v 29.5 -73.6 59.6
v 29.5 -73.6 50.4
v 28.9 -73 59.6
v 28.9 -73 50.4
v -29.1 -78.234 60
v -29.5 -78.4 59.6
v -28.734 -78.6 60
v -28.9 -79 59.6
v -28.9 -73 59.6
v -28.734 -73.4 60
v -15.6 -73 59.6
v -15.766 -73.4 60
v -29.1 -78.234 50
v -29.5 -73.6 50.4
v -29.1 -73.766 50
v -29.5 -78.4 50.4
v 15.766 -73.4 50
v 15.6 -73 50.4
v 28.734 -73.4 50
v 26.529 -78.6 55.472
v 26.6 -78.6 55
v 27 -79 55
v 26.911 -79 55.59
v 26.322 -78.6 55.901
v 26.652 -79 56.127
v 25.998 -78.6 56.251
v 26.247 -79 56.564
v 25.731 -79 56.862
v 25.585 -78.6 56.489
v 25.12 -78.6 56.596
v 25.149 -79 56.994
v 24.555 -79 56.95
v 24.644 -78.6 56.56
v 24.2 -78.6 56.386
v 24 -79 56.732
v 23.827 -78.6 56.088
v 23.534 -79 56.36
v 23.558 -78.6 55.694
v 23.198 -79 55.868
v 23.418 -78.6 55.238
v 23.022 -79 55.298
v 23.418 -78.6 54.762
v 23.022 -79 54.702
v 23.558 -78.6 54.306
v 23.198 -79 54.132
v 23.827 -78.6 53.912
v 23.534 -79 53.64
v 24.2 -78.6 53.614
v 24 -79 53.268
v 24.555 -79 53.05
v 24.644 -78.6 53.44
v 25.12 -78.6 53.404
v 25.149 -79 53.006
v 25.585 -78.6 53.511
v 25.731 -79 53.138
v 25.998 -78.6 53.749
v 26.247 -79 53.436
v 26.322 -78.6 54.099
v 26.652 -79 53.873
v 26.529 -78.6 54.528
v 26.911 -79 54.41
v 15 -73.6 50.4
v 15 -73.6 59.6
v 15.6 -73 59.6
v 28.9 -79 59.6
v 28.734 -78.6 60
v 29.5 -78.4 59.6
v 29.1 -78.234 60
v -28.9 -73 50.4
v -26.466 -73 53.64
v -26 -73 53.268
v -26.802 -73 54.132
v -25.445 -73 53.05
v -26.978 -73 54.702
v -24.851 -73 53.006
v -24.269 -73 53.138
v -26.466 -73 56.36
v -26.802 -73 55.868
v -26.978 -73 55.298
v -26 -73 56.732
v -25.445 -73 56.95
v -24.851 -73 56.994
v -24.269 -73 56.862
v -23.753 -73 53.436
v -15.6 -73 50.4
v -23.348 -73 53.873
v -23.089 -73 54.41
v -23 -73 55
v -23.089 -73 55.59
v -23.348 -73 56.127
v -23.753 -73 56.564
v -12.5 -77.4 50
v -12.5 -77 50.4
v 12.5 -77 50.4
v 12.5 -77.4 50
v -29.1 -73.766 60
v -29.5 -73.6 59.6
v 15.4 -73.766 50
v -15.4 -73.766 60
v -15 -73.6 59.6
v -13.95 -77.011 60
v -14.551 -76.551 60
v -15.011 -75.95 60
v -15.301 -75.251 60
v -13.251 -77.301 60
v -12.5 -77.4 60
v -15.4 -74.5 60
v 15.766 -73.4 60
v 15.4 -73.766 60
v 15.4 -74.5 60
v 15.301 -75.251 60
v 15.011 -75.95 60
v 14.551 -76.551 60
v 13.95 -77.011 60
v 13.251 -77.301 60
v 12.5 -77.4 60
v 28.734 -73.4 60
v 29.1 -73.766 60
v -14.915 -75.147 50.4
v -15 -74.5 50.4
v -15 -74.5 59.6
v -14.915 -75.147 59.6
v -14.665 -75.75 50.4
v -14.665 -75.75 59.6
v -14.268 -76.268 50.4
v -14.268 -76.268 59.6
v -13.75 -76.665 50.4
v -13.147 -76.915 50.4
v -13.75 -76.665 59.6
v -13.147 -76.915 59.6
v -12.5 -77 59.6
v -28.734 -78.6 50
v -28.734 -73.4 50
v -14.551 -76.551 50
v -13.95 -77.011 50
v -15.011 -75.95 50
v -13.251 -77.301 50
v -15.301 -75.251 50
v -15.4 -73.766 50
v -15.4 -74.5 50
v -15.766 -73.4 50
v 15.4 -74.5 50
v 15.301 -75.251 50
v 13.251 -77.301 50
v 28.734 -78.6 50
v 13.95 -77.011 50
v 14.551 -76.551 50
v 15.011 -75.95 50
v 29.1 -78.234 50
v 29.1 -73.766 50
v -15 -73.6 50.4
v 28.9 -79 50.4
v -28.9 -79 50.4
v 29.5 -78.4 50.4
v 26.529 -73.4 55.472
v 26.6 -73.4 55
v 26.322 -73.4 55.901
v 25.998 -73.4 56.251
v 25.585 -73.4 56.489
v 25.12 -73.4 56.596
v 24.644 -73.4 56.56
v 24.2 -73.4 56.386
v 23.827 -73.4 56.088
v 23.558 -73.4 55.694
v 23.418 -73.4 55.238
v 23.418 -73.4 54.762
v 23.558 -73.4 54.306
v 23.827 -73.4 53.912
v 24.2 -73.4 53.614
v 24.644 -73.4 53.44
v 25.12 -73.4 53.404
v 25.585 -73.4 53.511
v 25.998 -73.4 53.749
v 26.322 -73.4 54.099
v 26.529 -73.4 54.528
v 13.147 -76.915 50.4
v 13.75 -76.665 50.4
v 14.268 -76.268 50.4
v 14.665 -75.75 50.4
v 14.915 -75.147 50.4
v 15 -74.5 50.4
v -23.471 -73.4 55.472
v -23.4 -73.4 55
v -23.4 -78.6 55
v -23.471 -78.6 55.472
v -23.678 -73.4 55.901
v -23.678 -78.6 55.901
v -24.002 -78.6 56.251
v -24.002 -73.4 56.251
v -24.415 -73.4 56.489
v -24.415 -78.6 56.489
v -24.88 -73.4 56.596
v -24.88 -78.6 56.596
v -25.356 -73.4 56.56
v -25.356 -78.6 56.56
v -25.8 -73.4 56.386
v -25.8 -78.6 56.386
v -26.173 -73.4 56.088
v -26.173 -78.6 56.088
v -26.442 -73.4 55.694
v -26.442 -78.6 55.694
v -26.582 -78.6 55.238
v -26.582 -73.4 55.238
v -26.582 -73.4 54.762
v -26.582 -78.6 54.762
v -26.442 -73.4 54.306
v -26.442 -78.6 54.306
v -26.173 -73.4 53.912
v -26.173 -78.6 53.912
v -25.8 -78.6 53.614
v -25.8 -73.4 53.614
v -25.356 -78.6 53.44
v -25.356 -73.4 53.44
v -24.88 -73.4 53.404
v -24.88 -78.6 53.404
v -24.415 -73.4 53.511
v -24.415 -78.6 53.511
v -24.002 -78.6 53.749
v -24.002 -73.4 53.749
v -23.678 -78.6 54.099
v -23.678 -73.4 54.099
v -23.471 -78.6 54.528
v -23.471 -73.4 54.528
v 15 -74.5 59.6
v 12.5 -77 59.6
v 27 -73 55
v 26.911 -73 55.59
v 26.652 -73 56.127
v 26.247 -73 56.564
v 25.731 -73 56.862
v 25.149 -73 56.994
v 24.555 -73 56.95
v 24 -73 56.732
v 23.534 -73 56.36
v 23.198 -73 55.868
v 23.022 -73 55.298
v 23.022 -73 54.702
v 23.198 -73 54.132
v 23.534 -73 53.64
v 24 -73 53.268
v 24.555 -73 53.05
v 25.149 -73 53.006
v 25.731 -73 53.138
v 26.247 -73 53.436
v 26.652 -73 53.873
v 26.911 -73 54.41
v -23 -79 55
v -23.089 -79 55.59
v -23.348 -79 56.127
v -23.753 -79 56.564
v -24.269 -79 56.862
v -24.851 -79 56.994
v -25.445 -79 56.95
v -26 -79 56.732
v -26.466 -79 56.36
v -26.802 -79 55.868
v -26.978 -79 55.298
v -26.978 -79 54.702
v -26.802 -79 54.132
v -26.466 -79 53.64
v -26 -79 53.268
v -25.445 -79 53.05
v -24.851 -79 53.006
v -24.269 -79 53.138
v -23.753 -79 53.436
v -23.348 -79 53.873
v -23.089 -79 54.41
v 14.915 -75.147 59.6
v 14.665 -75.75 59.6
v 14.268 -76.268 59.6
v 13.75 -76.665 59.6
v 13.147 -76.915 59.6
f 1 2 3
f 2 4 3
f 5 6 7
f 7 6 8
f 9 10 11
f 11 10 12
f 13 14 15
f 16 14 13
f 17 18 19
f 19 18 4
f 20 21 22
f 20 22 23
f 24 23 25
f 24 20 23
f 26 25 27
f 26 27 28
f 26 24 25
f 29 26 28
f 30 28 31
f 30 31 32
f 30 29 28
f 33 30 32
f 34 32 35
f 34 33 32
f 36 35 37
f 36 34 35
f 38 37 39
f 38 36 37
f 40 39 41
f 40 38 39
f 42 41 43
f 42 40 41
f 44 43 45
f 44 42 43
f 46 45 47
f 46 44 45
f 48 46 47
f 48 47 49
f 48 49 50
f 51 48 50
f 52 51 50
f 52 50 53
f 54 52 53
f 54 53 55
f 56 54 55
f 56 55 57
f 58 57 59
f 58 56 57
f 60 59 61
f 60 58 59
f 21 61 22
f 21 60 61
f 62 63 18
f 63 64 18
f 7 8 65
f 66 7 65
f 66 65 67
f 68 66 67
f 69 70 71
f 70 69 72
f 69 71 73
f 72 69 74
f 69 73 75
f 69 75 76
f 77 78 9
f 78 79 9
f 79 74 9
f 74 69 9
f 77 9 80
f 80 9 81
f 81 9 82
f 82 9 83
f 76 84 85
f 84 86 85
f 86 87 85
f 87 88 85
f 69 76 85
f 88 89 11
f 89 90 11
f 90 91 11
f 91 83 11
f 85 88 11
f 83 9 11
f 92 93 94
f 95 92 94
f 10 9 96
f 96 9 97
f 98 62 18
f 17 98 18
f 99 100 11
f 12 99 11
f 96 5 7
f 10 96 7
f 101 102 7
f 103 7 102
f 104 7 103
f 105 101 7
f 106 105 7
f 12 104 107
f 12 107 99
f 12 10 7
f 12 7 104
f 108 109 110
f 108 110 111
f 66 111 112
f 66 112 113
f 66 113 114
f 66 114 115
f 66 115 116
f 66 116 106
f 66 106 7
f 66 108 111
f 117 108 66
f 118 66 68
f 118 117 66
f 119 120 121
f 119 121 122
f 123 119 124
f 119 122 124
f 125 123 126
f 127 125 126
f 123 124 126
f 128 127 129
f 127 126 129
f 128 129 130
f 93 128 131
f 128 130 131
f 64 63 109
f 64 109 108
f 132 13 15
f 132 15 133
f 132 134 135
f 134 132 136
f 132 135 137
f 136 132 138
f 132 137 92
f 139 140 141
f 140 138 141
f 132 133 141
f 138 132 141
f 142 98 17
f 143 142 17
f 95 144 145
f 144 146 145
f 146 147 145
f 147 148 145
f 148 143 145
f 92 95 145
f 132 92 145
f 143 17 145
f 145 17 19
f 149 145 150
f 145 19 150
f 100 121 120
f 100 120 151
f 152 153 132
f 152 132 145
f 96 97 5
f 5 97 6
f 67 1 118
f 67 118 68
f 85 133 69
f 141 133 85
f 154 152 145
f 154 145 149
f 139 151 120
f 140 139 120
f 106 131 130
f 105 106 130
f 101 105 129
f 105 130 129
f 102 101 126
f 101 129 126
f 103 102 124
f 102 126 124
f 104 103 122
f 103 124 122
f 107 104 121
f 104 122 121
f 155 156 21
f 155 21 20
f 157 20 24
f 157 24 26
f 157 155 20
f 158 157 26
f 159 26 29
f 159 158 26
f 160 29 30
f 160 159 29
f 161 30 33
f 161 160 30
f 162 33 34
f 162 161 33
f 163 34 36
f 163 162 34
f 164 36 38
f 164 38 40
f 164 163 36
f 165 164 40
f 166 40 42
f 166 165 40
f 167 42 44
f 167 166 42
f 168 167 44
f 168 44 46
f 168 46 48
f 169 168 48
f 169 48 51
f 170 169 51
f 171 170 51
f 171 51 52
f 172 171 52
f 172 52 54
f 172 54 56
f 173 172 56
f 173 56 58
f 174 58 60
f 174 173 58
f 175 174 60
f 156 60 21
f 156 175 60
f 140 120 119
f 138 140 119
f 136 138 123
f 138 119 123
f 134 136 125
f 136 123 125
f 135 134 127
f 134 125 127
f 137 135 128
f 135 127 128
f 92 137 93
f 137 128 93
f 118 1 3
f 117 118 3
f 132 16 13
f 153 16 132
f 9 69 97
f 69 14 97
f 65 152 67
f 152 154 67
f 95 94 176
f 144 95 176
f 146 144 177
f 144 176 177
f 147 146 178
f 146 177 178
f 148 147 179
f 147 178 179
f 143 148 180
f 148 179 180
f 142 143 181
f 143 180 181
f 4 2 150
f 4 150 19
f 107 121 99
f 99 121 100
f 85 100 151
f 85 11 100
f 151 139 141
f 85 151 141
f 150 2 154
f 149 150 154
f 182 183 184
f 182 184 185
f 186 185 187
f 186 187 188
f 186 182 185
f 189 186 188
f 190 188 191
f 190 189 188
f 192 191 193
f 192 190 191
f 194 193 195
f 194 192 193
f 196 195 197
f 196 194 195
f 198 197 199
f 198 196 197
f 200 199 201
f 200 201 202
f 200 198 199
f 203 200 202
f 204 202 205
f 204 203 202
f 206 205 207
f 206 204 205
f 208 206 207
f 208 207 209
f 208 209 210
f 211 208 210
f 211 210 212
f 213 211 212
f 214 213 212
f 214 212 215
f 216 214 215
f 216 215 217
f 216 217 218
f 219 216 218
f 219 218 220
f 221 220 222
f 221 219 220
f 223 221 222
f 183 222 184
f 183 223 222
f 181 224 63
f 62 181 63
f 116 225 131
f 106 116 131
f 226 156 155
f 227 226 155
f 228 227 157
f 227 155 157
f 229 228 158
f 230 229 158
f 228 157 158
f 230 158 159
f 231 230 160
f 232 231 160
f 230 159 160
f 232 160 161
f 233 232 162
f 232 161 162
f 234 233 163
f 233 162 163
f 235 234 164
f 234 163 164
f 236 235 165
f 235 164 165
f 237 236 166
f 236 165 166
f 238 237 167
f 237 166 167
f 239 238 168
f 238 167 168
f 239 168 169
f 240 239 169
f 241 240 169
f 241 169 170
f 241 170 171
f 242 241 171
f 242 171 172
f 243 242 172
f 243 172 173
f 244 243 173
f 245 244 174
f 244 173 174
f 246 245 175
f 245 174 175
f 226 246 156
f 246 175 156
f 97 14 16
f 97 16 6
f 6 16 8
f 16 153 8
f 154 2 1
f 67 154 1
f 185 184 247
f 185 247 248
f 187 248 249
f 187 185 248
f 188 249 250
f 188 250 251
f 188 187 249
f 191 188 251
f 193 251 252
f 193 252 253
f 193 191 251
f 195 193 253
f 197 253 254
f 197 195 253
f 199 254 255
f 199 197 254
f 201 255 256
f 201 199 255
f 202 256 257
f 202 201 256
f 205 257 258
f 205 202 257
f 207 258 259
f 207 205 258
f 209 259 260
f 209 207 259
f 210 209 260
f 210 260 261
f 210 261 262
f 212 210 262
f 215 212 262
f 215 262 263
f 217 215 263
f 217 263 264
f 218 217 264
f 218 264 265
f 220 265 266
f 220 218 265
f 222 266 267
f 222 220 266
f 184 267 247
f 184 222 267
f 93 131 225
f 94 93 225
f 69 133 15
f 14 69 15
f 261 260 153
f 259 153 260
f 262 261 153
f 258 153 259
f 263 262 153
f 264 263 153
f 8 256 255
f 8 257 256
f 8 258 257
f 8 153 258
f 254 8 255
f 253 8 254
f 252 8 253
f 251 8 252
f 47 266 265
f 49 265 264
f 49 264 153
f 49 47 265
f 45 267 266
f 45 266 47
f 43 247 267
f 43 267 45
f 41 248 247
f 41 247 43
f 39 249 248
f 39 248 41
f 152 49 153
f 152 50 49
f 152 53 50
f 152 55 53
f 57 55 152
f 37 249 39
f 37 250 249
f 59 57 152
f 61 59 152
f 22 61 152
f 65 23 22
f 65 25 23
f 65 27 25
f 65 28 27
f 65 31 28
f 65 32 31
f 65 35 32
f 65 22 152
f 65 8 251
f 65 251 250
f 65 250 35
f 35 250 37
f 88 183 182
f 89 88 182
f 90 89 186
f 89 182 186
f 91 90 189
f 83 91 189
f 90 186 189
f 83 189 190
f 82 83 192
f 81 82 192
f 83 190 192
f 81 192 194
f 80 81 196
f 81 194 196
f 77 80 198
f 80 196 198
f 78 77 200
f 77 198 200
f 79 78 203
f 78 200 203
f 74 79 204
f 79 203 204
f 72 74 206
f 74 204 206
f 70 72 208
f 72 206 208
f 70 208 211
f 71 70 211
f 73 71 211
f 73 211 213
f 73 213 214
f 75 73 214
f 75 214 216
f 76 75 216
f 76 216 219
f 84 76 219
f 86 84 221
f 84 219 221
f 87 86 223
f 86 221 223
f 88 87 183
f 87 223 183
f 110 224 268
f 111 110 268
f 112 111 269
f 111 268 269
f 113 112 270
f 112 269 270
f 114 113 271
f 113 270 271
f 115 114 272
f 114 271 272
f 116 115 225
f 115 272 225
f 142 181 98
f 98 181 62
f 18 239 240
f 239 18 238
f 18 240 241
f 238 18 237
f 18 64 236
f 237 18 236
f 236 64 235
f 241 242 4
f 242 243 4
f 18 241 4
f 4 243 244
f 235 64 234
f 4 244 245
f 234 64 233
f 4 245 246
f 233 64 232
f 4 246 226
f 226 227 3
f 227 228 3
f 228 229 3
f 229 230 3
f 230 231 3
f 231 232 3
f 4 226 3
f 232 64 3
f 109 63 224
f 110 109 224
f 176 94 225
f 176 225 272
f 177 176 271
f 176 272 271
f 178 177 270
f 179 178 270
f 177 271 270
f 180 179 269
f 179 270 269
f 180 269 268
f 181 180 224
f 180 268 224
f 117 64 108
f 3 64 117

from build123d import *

# Parameters (mm, degrees)
SKETCH134_W     = 59
SKETCH134_H     = 10
SKETCH134_R     = 1.6
PAD068_DEPTH    = 6
SKETCH135_W     = 30
SKETCH135_H     = 4
POCKET066_DEPTH = 7.5
FILLET048_R     = 2.5
CHAMFER053_SIZE = 0.6
CHAMFER054_SIZE = 0.4
CHAMFER055_SIZE = 0.4


with BuildPart() as part:
    # Sketch134 → Pad068 (new body)
    with BuildSketch(Plane.XZ):
        Rectangle(SKETCH134_W, SKETCH134_H)
        with Locations((-25, 0)):
            Circle(SKETCH134_R, mode=Mode.SUBTRACT)
        with Locations((25, 0)):
            Circle(SKETCH134_R, mode=Mode.SUBTRACT)
    extrude(amount=PAD068_DEPTH)

    # Sketch135 → Pocket066 (cut, symmetric)
    with BuildSketch(Plane.XY):
        with Locations((0, -2)):
            Rectangle(SKETCH135_W, SKETCH135_H)
    extrude(amount=POCKET066_DEPTH, both=True, mode=Mode.SUBTRACT)

    # Fillet048
    fillet048_edges = [part.edges().sort_by_distance(p)[0] for p in [
        (15, -4, 0),
        (-15, -4, 0),
    ]]
    fillet(fillet048_edges, radius=FILLET048_R)

    # Chamfer053
    chamfer053_edges = [part.edges().sort_by_distance(p)[0] for p in [
        (15, 0, 0),
        (-15, 0, 0),
        (29.5, 0, 0),
        (29.5, -6, 0),
        (-29.5, -6, 0),
        (-29.5, 0, 0),
    ]]
    chamfer(chamfer053_edges, length=CHAMFER053_SIZE)

    # Chamfer054
    chamfer054_edges = [part.edges().sort_by_distance(p)[0] for p in [
        (26.6, -3, 0),
        (23.4, 0, 0),
        (23.4, -6, 0),
        (-23.4, -3, 0),
        (-26.6, 0, 0),
        (-26.6, -6, 0),
    ]]
    chamfer(chamfer054_edges, length=CHAMFER054_SIZE)

    # Chamfer055
    chamfer055_edges = [part.edges().sort_by_distance(p)[0] for p in [
        (-15, -1.05, 5),
        (-15.3, -0.3, 5),
        (-14.267767, -3.267767, 5),
        (-22.25, 0, 5),
        (0, -4, 5),
        (-29.2, -0.3, 5),
        (14.267767, -3.267767, 5),
        (-29.5, -3, 5),
        (15, -1.05, 5),
        (-29.2, -5.7, 5),
        (15.3, -0.3, 5),
        (0, -6, 5),
        (22.25, 0, 5),
        (29.2, -5.7, 5),
        (29.2, -0.3, 5),
        (29.5, -3, 5),
        (15, -1.05, -5),
        (15.3, -0.3, -5),
        (14.267767, -3.267767, -5),
        (22.25, 0, -5),
        (0, -4, -5),
        (29.2, -0.3, -5),
        (-14.267767, -3.267767, -5),
        (29.5, -3, -5),
        (-15, -1.05, -5),
        (29.2, -5.7, -5),
        (-15.3, -0.3, -5),
        (0, -6, -5),
        (-22.25, 0, -5),
        (-29.2, -5.7, -5),
        (-29.2, -0.3, -5),
        (-29.5, -3, -5),
    ]]
    chamfer(chamfer055_edges, length=CHAMFER055_SIZE)


with BuildPart() as part_1:
    # Body051 placement: moved
    add(part.part.moved(Location((0, -73, 55))))


solid = part_1.part
